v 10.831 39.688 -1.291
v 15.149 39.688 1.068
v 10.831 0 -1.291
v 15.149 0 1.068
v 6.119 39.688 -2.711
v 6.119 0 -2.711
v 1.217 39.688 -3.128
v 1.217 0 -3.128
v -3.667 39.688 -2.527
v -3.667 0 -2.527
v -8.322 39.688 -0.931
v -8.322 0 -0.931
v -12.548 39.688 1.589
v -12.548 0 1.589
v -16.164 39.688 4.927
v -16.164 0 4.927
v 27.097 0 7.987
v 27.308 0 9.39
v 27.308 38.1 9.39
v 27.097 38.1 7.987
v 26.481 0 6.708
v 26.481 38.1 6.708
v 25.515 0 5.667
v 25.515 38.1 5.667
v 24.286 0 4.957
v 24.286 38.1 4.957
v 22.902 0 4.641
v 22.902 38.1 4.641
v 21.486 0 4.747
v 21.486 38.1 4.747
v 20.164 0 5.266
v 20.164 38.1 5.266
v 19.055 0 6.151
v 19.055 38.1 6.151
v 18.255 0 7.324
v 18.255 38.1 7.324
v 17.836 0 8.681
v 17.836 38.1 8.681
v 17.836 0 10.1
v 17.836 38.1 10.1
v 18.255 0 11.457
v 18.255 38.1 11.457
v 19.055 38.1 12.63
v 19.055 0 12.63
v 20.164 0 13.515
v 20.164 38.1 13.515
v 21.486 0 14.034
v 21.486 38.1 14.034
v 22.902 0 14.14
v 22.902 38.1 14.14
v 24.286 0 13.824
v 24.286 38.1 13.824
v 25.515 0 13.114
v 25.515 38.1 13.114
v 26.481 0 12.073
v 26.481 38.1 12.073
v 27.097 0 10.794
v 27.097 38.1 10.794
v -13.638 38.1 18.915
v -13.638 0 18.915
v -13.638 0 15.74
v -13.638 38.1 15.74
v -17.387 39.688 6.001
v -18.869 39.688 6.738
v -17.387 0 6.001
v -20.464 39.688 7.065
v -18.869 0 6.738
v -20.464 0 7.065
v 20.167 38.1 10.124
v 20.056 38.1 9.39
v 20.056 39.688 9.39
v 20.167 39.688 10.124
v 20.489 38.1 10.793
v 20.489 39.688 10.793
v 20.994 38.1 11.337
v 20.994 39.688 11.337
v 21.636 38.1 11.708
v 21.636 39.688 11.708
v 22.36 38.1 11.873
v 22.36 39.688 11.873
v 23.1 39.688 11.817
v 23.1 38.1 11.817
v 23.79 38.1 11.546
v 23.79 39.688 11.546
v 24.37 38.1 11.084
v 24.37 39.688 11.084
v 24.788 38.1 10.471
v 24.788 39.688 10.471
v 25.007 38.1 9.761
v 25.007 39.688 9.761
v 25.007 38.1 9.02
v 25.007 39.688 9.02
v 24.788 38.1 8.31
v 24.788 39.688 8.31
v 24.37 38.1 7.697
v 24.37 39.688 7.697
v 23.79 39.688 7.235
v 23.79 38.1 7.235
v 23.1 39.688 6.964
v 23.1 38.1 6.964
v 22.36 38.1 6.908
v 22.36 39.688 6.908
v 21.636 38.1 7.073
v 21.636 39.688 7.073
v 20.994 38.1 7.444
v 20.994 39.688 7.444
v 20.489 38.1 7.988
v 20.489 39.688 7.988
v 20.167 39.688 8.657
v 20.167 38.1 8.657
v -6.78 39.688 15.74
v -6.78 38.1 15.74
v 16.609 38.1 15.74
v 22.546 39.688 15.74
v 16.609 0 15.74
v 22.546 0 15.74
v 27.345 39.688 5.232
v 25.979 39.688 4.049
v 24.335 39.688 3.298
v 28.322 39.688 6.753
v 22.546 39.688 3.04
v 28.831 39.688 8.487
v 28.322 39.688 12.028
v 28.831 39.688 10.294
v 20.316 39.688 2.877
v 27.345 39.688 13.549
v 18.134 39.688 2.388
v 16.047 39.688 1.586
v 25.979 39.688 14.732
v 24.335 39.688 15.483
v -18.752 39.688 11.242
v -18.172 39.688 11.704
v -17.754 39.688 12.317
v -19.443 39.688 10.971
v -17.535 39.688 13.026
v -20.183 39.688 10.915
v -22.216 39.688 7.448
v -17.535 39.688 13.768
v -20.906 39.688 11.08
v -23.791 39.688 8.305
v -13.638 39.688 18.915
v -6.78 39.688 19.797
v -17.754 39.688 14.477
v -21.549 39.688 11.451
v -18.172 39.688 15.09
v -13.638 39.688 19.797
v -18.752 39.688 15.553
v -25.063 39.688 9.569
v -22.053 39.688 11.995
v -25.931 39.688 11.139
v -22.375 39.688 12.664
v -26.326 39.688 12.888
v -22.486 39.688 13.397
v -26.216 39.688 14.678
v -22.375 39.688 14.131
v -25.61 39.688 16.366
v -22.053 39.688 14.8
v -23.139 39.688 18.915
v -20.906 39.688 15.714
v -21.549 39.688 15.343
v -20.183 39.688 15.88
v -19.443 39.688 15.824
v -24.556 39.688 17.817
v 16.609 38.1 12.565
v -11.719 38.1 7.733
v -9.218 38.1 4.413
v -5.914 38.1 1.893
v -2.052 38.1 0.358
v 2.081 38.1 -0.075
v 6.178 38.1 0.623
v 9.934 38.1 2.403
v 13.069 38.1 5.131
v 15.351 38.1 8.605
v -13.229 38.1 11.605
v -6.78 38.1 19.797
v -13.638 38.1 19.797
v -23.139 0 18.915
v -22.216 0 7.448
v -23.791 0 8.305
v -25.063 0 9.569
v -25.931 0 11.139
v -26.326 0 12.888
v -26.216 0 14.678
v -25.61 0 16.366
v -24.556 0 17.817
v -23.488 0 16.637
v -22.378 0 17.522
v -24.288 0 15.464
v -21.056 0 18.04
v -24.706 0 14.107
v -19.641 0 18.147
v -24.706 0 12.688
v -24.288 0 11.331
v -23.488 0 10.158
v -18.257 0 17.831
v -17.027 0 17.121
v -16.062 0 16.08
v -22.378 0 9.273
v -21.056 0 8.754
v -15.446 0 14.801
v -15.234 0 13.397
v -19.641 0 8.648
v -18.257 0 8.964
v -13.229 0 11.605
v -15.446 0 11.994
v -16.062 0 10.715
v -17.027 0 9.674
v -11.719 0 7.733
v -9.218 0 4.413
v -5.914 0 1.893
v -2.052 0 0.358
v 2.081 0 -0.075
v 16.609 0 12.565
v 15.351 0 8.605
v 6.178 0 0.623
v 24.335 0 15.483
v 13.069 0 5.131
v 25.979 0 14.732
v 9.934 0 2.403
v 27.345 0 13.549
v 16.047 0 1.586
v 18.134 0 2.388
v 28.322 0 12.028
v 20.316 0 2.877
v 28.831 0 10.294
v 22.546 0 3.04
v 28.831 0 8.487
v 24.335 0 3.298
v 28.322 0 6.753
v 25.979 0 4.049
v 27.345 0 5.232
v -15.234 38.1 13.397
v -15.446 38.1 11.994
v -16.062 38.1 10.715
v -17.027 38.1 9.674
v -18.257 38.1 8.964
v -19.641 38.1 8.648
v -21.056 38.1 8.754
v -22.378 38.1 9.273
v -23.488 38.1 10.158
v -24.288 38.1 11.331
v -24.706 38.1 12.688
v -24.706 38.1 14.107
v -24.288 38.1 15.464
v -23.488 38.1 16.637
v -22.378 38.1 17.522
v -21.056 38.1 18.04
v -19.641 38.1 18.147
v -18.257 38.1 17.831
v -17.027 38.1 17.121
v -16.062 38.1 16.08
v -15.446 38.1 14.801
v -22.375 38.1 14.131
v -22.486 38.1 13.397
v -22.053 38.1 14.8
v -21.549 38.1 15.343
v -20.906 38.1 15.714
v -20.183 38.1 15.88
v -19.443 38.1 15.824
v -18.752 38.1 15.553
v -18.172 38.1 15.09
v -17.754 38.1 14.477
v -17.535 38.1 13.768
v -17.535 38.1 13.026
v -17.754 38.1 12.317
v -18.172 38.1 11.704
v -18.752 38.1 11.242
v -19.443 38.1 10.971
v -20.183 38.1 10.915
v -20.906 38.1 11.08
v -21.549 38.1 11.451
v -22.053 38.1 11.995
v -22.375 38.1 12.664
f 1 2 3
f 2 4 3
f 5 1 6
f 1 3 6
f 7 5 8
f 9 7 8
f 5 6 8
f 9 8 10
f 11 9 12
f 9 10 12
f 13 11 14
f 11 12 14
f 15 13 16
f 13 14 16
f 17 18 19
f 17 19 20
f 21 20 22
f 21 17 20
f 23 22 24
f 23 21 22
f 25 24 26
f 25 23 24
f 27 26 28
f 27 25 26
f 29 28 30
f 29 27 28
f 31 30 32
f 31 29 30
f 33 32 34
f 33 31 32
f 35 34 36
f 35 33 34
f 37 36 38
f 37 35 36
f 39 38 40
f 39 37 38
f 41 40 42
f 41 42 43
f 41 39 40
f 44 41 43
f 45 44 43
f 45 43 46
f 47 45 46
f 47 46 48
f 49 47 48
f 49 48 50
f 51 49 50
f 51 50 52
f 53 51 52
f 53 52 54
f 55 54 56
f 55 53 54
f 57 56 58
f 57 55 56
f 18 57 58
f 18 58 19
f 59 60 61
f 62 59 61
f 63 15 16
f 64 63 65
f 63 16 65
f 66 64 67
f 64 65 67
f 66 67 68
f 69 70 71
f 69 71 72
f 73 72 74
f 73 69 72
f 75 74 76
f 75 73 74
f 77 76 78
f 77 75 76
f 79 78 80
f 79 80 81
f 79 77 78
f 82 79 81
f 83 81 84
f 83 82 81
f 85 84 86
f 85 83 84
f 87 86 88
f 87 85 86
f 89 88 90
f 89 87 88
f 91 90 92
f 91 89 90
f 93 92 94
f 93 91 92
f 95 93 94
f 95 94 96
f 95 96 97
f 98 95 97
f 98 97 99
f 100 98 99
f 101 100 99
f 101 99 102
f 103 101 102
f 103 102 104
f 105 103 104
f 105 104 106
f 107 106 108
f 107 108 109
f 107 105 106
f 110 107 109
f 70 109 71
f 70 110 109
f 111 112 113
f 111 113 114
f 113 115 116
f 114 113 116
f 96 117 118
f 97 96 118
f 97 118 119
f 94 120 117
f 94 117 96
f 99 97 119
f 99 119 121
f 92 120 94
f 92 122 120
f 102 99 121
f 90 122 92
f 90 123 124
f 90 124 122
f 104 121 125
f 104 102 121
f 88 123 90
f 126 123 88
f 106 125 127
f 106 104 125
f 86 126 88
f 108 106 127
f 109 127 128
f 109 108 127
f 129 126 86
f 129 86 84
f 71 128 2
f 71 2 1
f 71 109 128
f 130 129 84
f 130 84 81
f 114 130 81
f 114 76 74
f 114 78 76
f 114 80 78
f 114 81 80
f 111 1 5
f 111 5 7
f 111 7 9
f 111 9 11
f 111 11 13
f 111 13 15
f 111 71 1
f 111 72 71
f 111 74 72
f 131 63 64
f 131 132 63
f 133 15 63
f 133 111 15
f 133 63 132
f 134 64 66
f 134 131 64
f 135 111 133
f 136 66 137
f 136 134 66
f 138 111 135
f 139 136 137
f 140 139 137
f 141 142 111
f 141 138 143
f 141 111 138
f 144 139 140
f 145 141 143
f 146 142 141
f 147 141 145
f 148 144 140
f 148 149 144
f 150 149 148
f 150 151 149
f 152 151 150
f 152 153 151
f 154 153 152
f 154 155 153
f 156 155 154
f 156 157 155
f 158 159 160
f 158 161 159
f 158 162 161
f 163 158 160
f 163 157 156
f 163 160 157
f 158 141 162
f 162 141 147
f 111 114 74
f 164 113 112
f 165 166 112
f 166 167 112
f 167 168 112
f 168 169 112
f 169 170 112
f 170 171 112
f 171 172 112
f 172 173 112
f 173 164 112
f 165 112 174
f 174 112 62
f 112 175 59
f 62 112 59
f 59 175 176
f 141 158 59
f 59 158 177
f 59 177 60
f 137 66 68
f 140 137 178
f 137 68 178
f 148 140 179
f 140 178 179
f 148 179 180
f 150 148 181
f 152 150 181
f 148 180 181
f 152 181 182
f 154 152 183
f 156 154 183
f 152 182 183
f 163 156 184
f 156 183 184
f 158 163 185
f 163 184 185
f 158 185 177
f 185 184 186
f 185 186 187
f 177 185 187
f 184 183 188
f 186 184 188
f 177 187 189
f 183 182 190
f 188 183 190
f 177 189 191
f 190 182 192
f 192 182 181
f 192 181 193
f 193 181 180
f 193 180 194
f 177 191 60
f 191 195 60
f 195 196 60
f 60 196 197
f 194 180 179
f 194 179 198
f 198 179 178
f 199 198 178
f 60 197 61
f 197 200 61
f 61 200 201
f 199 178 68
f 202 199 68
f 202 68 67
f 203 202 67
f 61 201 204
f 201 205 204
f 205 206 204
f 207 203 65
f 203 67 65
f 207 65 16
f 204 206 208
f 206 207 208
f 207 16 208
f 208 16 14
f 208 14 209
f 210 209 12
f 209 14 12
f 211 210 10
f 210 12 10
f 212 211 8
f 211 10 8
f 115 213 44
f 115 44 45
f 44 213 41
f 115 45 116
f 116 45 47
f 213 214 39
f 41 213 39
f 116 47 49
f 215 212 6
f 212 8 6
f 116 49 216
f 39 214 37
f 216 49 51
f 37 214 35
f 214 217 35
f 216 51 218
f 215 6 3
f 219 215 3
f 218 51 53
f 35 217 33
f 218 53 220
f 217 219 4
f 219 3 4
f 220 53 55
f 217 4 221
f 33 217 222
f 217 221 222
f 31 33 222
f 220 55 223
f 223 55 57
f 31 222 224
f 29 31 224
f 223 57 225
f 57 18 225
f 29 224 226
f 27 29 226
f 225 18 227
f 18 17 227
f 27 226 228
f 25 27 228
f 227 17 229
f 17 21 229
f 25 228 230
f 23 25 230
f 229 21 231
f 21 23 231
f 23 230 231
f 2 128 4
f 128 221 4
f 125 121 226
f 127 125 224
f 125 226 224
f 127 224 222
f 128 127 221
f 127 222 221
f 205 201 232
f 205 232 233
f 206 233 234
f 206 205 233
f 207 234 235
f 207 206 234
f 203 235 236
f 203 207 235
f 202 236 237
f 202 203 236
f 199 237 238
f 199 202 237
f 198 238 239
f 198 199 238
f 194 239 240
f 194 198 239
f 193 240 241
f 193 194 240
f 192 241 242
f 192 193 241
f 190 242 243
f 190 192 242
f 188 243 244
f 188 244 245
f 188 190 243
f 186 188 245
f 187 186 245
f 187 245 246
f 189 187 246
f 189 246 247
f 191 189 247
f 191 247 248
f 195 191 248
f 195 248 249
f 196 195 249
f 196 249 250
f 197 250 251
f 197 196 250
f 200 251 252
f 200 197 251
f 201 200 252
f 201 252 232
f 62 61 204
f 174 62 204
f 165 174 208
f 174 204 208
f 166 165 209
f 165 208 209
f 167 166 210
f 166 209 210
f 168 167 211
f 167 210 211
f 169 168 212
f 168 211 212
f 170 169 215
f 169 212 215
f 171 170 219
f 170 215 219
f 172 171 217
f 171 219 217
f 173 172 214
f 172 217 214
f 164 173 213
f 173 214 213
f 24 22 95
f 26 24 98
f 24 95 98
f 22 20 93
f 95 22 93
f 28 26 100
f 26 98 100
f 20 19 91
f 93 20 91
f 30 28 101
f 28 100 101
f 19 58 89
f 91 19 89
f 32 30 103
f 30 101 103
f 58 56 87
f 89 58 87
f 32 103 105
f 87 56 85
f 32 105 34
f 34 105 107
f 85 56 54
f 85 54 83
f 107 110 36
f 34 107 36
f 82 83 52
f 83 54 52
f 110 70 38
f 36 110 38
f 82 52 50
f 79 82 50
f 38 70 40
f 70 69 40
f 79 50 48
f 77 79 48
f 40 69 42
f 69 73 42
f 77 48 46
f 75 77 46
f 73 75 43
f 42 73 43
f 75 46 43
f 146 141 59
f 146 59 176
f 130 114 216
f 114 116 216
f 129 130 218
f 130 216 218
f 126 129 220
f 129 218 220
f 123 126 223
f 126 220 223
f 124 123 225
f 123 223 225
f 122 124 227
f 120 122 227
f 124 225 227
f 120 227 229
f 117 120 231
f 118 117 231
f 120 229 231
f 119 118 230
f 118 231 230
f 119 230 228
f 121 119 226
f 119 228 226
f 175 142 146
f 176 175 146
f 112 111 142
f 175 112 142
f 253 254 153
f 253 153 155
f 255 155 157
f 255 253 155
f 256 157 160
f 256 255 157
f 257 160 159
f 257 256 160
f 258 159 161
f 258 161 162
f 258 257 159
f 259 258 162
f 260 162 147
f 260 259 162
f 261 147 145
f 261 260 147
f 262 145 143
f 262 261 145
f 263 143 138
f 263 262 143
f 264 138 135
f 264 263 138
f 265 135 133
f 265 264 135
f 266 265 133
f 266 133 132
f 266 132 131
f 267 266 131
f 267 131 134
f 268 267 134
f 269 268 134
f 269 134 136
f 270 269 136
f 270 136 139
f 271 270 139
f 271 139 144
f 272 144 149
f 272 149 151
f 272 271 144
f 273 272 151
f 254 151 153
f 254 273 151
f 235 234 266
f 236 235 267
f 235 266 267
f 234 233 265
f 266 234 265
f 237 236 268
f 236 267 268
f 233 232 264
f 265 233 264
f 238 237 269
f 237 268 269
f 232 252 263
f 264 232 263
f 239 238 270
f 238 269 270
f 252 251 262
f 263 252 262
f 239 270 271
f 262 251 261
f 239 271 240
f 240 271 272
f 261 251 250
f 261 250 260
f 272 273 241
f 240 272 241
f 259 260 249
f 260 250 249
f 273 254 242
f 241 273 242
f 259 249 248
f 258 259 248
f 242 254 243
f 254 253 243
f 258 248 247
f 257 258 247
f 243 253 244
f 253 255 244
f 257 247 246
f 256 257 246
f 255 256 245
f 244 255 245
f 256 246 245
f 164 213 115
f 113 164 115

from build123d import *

# Parameters (mm, degrees)
SKETCH2_R           = 4.7625
BOSS_EXTRUDE1_DEPTH = 38.1
SKETCH3_R           = 2.4892
BOSS_EXTRUDE2_DEPTH = 1.5875
SKETCH4_W           = 6.858
SKETCH4_H           = 4.056568305
SKETCH4_W_2         = 20.112893425
SKETCH4_H_2         = 3.175
BOSS_EXTRUDE3_DEPTH = 1.5875
FILLET2_R           = 6.35


with BuildPart() as part:
    # Sketch2 → Boss-Extrude1 (new body)
    with BuildSketch(Plane(origin=(0, 0, 0), x_dir=(1, 0, 0), z_dir=(0, 1, 0))):
        with BuildLine():
            Line((-13.637822674, -18.9154966), (-13.637822674, -15.7404966))
            ThreePointArc((-13.637822674, -15.7404966), (0, 0), (16.609085938, -12.5654966))
            Line((16.609085938, -12.5654966), (16.609085938, -15.7404966))
            Line((16.609085938, -15.7404966), (22.545691393, -15.7404966))
            ThreePointArc((22.545691393, -15.7404966), (28.895691393, -9.3904966), (22.545691393, -3.0404966))
            ThreePointArc((22.545691393, -3.0404966), (18.914562129, -2.601594541), (15.492581173, -1.310168551))
            ThreePointArc((15.492581173, -1.310168551), (-2.207478742, 2.815047226), (-17.640279185, -6.783817119))
            ThreePointArc((-17.640279185, -6.783817119), (-18.810770101, -6.984553123), (-19.996688426, -7.047335697))
            ThreePointArc((-19.996688426, -7.047335697), (-26.135207048, -11.772192893), (-23.138726022, -18.9154966))
            Line((-23.138726022, -18.9154966), (-13.637822674, -18.9154966))
        make_face()
        with Locations((-19.996688426, -13.397335697)):
            Circle(SKETCH2_R, mode=Mode.SUBTRACT)
        with Locations((22.545691393, -9.3904966)):
            Circle(SKETCH2_R, mode=Mode.SUBTRACT)
    extrude(amount=BOSS_EXTRUDE1_DEPTH)

    # Sketch3 → Boss-Extrude2 (add)
    with BuildSketch(Plane(origin=(0, 38.1, 0), x_dir=(-1, 0, 0), z_dir=(0, 1, 0))):
        with BuildLine():
            Line((13.637822674, 15.7404966), (3.503807487, 15.7404966))
            Line((3.503807487, 15.7404966), (3.503807487, 12.5654966))
            Line((3.503807487, 12.5654966), (-16.609085938, 12.5654966))
            Line((-16.609085938, 12.5654966), (-16.609085938, 15.7404966))
            Line((-16.609085938, 15.7404966), (-22.545691393, 15.7404966))
            ThreePointArc((-22.545691393, 15.7404966), (-28.895691393, 9.3904966), (-22.545691393, 3.0404966))
            ThreePointArc((-22.545691393, 3.0404966), (-18.914562129, 2.601594541), (-15.492581173, 1.310168551))
            ThreePointArc((-15.492581173, 1.310168551), (2.207478742, -2.815047226), (17.640279185, 6.783817119))
            ThreePointArc((17.640279185, 6.783817119), (18.810770101, 6.984553123), (19.996688426, 7.047335697))
            ThreePointArc((19.996688426, 7.047335697), (26.135207048, 11.772192893), (23.138726022, 18.9154966))
            Line((23.138726022, 18.9154966), (13.637822674, 18.9154966))
            Line((13.637822674, 18.9154966), (13.637822674, 15.7404966))
        make_face()
        with Locations((-22.545691393, 9.3904966)):
            Circle(SKETCH3_R, mode=Mode.SUBTRACT)
        with Locations((19.996688426, 13.397335697)):
            Circle(SKETCH3_R, mode=Mode.SUBTRACT)
    extrude(amount=BOSS_EXTRUDE2_DEPTH)

    # Sketch4 → Boss-Extrude3 (add)
    with BuildSketch(Plane(origin=(0, 39.6875, 0), x_dir=(-1, 0, 0), z_dir=(0, 1, 0))):
        with Locations((10.208822674, 17.768780752)):
            Rectangle(SKETCH4_W, SKETCH4_H)
        with Locations((-6.552639226, 14.1529966)):
            Rectangle(SKETCH4_W_2, SKETCH4_H_2)
    extrude(amount=-BOSS_EXTRUDE3_DEPTH)

    # Fillet2
    fillet2_edges = [part.edges().sort_by_distance(p)[0] for p in [
        (15.492581173, 19.84375, 1.310168551),
        (-17.640279185, 19.84375, 6.783817119),
    ]]
    fillet(fillet2_edges, radius=FILLET2_R)


solid = part.part
